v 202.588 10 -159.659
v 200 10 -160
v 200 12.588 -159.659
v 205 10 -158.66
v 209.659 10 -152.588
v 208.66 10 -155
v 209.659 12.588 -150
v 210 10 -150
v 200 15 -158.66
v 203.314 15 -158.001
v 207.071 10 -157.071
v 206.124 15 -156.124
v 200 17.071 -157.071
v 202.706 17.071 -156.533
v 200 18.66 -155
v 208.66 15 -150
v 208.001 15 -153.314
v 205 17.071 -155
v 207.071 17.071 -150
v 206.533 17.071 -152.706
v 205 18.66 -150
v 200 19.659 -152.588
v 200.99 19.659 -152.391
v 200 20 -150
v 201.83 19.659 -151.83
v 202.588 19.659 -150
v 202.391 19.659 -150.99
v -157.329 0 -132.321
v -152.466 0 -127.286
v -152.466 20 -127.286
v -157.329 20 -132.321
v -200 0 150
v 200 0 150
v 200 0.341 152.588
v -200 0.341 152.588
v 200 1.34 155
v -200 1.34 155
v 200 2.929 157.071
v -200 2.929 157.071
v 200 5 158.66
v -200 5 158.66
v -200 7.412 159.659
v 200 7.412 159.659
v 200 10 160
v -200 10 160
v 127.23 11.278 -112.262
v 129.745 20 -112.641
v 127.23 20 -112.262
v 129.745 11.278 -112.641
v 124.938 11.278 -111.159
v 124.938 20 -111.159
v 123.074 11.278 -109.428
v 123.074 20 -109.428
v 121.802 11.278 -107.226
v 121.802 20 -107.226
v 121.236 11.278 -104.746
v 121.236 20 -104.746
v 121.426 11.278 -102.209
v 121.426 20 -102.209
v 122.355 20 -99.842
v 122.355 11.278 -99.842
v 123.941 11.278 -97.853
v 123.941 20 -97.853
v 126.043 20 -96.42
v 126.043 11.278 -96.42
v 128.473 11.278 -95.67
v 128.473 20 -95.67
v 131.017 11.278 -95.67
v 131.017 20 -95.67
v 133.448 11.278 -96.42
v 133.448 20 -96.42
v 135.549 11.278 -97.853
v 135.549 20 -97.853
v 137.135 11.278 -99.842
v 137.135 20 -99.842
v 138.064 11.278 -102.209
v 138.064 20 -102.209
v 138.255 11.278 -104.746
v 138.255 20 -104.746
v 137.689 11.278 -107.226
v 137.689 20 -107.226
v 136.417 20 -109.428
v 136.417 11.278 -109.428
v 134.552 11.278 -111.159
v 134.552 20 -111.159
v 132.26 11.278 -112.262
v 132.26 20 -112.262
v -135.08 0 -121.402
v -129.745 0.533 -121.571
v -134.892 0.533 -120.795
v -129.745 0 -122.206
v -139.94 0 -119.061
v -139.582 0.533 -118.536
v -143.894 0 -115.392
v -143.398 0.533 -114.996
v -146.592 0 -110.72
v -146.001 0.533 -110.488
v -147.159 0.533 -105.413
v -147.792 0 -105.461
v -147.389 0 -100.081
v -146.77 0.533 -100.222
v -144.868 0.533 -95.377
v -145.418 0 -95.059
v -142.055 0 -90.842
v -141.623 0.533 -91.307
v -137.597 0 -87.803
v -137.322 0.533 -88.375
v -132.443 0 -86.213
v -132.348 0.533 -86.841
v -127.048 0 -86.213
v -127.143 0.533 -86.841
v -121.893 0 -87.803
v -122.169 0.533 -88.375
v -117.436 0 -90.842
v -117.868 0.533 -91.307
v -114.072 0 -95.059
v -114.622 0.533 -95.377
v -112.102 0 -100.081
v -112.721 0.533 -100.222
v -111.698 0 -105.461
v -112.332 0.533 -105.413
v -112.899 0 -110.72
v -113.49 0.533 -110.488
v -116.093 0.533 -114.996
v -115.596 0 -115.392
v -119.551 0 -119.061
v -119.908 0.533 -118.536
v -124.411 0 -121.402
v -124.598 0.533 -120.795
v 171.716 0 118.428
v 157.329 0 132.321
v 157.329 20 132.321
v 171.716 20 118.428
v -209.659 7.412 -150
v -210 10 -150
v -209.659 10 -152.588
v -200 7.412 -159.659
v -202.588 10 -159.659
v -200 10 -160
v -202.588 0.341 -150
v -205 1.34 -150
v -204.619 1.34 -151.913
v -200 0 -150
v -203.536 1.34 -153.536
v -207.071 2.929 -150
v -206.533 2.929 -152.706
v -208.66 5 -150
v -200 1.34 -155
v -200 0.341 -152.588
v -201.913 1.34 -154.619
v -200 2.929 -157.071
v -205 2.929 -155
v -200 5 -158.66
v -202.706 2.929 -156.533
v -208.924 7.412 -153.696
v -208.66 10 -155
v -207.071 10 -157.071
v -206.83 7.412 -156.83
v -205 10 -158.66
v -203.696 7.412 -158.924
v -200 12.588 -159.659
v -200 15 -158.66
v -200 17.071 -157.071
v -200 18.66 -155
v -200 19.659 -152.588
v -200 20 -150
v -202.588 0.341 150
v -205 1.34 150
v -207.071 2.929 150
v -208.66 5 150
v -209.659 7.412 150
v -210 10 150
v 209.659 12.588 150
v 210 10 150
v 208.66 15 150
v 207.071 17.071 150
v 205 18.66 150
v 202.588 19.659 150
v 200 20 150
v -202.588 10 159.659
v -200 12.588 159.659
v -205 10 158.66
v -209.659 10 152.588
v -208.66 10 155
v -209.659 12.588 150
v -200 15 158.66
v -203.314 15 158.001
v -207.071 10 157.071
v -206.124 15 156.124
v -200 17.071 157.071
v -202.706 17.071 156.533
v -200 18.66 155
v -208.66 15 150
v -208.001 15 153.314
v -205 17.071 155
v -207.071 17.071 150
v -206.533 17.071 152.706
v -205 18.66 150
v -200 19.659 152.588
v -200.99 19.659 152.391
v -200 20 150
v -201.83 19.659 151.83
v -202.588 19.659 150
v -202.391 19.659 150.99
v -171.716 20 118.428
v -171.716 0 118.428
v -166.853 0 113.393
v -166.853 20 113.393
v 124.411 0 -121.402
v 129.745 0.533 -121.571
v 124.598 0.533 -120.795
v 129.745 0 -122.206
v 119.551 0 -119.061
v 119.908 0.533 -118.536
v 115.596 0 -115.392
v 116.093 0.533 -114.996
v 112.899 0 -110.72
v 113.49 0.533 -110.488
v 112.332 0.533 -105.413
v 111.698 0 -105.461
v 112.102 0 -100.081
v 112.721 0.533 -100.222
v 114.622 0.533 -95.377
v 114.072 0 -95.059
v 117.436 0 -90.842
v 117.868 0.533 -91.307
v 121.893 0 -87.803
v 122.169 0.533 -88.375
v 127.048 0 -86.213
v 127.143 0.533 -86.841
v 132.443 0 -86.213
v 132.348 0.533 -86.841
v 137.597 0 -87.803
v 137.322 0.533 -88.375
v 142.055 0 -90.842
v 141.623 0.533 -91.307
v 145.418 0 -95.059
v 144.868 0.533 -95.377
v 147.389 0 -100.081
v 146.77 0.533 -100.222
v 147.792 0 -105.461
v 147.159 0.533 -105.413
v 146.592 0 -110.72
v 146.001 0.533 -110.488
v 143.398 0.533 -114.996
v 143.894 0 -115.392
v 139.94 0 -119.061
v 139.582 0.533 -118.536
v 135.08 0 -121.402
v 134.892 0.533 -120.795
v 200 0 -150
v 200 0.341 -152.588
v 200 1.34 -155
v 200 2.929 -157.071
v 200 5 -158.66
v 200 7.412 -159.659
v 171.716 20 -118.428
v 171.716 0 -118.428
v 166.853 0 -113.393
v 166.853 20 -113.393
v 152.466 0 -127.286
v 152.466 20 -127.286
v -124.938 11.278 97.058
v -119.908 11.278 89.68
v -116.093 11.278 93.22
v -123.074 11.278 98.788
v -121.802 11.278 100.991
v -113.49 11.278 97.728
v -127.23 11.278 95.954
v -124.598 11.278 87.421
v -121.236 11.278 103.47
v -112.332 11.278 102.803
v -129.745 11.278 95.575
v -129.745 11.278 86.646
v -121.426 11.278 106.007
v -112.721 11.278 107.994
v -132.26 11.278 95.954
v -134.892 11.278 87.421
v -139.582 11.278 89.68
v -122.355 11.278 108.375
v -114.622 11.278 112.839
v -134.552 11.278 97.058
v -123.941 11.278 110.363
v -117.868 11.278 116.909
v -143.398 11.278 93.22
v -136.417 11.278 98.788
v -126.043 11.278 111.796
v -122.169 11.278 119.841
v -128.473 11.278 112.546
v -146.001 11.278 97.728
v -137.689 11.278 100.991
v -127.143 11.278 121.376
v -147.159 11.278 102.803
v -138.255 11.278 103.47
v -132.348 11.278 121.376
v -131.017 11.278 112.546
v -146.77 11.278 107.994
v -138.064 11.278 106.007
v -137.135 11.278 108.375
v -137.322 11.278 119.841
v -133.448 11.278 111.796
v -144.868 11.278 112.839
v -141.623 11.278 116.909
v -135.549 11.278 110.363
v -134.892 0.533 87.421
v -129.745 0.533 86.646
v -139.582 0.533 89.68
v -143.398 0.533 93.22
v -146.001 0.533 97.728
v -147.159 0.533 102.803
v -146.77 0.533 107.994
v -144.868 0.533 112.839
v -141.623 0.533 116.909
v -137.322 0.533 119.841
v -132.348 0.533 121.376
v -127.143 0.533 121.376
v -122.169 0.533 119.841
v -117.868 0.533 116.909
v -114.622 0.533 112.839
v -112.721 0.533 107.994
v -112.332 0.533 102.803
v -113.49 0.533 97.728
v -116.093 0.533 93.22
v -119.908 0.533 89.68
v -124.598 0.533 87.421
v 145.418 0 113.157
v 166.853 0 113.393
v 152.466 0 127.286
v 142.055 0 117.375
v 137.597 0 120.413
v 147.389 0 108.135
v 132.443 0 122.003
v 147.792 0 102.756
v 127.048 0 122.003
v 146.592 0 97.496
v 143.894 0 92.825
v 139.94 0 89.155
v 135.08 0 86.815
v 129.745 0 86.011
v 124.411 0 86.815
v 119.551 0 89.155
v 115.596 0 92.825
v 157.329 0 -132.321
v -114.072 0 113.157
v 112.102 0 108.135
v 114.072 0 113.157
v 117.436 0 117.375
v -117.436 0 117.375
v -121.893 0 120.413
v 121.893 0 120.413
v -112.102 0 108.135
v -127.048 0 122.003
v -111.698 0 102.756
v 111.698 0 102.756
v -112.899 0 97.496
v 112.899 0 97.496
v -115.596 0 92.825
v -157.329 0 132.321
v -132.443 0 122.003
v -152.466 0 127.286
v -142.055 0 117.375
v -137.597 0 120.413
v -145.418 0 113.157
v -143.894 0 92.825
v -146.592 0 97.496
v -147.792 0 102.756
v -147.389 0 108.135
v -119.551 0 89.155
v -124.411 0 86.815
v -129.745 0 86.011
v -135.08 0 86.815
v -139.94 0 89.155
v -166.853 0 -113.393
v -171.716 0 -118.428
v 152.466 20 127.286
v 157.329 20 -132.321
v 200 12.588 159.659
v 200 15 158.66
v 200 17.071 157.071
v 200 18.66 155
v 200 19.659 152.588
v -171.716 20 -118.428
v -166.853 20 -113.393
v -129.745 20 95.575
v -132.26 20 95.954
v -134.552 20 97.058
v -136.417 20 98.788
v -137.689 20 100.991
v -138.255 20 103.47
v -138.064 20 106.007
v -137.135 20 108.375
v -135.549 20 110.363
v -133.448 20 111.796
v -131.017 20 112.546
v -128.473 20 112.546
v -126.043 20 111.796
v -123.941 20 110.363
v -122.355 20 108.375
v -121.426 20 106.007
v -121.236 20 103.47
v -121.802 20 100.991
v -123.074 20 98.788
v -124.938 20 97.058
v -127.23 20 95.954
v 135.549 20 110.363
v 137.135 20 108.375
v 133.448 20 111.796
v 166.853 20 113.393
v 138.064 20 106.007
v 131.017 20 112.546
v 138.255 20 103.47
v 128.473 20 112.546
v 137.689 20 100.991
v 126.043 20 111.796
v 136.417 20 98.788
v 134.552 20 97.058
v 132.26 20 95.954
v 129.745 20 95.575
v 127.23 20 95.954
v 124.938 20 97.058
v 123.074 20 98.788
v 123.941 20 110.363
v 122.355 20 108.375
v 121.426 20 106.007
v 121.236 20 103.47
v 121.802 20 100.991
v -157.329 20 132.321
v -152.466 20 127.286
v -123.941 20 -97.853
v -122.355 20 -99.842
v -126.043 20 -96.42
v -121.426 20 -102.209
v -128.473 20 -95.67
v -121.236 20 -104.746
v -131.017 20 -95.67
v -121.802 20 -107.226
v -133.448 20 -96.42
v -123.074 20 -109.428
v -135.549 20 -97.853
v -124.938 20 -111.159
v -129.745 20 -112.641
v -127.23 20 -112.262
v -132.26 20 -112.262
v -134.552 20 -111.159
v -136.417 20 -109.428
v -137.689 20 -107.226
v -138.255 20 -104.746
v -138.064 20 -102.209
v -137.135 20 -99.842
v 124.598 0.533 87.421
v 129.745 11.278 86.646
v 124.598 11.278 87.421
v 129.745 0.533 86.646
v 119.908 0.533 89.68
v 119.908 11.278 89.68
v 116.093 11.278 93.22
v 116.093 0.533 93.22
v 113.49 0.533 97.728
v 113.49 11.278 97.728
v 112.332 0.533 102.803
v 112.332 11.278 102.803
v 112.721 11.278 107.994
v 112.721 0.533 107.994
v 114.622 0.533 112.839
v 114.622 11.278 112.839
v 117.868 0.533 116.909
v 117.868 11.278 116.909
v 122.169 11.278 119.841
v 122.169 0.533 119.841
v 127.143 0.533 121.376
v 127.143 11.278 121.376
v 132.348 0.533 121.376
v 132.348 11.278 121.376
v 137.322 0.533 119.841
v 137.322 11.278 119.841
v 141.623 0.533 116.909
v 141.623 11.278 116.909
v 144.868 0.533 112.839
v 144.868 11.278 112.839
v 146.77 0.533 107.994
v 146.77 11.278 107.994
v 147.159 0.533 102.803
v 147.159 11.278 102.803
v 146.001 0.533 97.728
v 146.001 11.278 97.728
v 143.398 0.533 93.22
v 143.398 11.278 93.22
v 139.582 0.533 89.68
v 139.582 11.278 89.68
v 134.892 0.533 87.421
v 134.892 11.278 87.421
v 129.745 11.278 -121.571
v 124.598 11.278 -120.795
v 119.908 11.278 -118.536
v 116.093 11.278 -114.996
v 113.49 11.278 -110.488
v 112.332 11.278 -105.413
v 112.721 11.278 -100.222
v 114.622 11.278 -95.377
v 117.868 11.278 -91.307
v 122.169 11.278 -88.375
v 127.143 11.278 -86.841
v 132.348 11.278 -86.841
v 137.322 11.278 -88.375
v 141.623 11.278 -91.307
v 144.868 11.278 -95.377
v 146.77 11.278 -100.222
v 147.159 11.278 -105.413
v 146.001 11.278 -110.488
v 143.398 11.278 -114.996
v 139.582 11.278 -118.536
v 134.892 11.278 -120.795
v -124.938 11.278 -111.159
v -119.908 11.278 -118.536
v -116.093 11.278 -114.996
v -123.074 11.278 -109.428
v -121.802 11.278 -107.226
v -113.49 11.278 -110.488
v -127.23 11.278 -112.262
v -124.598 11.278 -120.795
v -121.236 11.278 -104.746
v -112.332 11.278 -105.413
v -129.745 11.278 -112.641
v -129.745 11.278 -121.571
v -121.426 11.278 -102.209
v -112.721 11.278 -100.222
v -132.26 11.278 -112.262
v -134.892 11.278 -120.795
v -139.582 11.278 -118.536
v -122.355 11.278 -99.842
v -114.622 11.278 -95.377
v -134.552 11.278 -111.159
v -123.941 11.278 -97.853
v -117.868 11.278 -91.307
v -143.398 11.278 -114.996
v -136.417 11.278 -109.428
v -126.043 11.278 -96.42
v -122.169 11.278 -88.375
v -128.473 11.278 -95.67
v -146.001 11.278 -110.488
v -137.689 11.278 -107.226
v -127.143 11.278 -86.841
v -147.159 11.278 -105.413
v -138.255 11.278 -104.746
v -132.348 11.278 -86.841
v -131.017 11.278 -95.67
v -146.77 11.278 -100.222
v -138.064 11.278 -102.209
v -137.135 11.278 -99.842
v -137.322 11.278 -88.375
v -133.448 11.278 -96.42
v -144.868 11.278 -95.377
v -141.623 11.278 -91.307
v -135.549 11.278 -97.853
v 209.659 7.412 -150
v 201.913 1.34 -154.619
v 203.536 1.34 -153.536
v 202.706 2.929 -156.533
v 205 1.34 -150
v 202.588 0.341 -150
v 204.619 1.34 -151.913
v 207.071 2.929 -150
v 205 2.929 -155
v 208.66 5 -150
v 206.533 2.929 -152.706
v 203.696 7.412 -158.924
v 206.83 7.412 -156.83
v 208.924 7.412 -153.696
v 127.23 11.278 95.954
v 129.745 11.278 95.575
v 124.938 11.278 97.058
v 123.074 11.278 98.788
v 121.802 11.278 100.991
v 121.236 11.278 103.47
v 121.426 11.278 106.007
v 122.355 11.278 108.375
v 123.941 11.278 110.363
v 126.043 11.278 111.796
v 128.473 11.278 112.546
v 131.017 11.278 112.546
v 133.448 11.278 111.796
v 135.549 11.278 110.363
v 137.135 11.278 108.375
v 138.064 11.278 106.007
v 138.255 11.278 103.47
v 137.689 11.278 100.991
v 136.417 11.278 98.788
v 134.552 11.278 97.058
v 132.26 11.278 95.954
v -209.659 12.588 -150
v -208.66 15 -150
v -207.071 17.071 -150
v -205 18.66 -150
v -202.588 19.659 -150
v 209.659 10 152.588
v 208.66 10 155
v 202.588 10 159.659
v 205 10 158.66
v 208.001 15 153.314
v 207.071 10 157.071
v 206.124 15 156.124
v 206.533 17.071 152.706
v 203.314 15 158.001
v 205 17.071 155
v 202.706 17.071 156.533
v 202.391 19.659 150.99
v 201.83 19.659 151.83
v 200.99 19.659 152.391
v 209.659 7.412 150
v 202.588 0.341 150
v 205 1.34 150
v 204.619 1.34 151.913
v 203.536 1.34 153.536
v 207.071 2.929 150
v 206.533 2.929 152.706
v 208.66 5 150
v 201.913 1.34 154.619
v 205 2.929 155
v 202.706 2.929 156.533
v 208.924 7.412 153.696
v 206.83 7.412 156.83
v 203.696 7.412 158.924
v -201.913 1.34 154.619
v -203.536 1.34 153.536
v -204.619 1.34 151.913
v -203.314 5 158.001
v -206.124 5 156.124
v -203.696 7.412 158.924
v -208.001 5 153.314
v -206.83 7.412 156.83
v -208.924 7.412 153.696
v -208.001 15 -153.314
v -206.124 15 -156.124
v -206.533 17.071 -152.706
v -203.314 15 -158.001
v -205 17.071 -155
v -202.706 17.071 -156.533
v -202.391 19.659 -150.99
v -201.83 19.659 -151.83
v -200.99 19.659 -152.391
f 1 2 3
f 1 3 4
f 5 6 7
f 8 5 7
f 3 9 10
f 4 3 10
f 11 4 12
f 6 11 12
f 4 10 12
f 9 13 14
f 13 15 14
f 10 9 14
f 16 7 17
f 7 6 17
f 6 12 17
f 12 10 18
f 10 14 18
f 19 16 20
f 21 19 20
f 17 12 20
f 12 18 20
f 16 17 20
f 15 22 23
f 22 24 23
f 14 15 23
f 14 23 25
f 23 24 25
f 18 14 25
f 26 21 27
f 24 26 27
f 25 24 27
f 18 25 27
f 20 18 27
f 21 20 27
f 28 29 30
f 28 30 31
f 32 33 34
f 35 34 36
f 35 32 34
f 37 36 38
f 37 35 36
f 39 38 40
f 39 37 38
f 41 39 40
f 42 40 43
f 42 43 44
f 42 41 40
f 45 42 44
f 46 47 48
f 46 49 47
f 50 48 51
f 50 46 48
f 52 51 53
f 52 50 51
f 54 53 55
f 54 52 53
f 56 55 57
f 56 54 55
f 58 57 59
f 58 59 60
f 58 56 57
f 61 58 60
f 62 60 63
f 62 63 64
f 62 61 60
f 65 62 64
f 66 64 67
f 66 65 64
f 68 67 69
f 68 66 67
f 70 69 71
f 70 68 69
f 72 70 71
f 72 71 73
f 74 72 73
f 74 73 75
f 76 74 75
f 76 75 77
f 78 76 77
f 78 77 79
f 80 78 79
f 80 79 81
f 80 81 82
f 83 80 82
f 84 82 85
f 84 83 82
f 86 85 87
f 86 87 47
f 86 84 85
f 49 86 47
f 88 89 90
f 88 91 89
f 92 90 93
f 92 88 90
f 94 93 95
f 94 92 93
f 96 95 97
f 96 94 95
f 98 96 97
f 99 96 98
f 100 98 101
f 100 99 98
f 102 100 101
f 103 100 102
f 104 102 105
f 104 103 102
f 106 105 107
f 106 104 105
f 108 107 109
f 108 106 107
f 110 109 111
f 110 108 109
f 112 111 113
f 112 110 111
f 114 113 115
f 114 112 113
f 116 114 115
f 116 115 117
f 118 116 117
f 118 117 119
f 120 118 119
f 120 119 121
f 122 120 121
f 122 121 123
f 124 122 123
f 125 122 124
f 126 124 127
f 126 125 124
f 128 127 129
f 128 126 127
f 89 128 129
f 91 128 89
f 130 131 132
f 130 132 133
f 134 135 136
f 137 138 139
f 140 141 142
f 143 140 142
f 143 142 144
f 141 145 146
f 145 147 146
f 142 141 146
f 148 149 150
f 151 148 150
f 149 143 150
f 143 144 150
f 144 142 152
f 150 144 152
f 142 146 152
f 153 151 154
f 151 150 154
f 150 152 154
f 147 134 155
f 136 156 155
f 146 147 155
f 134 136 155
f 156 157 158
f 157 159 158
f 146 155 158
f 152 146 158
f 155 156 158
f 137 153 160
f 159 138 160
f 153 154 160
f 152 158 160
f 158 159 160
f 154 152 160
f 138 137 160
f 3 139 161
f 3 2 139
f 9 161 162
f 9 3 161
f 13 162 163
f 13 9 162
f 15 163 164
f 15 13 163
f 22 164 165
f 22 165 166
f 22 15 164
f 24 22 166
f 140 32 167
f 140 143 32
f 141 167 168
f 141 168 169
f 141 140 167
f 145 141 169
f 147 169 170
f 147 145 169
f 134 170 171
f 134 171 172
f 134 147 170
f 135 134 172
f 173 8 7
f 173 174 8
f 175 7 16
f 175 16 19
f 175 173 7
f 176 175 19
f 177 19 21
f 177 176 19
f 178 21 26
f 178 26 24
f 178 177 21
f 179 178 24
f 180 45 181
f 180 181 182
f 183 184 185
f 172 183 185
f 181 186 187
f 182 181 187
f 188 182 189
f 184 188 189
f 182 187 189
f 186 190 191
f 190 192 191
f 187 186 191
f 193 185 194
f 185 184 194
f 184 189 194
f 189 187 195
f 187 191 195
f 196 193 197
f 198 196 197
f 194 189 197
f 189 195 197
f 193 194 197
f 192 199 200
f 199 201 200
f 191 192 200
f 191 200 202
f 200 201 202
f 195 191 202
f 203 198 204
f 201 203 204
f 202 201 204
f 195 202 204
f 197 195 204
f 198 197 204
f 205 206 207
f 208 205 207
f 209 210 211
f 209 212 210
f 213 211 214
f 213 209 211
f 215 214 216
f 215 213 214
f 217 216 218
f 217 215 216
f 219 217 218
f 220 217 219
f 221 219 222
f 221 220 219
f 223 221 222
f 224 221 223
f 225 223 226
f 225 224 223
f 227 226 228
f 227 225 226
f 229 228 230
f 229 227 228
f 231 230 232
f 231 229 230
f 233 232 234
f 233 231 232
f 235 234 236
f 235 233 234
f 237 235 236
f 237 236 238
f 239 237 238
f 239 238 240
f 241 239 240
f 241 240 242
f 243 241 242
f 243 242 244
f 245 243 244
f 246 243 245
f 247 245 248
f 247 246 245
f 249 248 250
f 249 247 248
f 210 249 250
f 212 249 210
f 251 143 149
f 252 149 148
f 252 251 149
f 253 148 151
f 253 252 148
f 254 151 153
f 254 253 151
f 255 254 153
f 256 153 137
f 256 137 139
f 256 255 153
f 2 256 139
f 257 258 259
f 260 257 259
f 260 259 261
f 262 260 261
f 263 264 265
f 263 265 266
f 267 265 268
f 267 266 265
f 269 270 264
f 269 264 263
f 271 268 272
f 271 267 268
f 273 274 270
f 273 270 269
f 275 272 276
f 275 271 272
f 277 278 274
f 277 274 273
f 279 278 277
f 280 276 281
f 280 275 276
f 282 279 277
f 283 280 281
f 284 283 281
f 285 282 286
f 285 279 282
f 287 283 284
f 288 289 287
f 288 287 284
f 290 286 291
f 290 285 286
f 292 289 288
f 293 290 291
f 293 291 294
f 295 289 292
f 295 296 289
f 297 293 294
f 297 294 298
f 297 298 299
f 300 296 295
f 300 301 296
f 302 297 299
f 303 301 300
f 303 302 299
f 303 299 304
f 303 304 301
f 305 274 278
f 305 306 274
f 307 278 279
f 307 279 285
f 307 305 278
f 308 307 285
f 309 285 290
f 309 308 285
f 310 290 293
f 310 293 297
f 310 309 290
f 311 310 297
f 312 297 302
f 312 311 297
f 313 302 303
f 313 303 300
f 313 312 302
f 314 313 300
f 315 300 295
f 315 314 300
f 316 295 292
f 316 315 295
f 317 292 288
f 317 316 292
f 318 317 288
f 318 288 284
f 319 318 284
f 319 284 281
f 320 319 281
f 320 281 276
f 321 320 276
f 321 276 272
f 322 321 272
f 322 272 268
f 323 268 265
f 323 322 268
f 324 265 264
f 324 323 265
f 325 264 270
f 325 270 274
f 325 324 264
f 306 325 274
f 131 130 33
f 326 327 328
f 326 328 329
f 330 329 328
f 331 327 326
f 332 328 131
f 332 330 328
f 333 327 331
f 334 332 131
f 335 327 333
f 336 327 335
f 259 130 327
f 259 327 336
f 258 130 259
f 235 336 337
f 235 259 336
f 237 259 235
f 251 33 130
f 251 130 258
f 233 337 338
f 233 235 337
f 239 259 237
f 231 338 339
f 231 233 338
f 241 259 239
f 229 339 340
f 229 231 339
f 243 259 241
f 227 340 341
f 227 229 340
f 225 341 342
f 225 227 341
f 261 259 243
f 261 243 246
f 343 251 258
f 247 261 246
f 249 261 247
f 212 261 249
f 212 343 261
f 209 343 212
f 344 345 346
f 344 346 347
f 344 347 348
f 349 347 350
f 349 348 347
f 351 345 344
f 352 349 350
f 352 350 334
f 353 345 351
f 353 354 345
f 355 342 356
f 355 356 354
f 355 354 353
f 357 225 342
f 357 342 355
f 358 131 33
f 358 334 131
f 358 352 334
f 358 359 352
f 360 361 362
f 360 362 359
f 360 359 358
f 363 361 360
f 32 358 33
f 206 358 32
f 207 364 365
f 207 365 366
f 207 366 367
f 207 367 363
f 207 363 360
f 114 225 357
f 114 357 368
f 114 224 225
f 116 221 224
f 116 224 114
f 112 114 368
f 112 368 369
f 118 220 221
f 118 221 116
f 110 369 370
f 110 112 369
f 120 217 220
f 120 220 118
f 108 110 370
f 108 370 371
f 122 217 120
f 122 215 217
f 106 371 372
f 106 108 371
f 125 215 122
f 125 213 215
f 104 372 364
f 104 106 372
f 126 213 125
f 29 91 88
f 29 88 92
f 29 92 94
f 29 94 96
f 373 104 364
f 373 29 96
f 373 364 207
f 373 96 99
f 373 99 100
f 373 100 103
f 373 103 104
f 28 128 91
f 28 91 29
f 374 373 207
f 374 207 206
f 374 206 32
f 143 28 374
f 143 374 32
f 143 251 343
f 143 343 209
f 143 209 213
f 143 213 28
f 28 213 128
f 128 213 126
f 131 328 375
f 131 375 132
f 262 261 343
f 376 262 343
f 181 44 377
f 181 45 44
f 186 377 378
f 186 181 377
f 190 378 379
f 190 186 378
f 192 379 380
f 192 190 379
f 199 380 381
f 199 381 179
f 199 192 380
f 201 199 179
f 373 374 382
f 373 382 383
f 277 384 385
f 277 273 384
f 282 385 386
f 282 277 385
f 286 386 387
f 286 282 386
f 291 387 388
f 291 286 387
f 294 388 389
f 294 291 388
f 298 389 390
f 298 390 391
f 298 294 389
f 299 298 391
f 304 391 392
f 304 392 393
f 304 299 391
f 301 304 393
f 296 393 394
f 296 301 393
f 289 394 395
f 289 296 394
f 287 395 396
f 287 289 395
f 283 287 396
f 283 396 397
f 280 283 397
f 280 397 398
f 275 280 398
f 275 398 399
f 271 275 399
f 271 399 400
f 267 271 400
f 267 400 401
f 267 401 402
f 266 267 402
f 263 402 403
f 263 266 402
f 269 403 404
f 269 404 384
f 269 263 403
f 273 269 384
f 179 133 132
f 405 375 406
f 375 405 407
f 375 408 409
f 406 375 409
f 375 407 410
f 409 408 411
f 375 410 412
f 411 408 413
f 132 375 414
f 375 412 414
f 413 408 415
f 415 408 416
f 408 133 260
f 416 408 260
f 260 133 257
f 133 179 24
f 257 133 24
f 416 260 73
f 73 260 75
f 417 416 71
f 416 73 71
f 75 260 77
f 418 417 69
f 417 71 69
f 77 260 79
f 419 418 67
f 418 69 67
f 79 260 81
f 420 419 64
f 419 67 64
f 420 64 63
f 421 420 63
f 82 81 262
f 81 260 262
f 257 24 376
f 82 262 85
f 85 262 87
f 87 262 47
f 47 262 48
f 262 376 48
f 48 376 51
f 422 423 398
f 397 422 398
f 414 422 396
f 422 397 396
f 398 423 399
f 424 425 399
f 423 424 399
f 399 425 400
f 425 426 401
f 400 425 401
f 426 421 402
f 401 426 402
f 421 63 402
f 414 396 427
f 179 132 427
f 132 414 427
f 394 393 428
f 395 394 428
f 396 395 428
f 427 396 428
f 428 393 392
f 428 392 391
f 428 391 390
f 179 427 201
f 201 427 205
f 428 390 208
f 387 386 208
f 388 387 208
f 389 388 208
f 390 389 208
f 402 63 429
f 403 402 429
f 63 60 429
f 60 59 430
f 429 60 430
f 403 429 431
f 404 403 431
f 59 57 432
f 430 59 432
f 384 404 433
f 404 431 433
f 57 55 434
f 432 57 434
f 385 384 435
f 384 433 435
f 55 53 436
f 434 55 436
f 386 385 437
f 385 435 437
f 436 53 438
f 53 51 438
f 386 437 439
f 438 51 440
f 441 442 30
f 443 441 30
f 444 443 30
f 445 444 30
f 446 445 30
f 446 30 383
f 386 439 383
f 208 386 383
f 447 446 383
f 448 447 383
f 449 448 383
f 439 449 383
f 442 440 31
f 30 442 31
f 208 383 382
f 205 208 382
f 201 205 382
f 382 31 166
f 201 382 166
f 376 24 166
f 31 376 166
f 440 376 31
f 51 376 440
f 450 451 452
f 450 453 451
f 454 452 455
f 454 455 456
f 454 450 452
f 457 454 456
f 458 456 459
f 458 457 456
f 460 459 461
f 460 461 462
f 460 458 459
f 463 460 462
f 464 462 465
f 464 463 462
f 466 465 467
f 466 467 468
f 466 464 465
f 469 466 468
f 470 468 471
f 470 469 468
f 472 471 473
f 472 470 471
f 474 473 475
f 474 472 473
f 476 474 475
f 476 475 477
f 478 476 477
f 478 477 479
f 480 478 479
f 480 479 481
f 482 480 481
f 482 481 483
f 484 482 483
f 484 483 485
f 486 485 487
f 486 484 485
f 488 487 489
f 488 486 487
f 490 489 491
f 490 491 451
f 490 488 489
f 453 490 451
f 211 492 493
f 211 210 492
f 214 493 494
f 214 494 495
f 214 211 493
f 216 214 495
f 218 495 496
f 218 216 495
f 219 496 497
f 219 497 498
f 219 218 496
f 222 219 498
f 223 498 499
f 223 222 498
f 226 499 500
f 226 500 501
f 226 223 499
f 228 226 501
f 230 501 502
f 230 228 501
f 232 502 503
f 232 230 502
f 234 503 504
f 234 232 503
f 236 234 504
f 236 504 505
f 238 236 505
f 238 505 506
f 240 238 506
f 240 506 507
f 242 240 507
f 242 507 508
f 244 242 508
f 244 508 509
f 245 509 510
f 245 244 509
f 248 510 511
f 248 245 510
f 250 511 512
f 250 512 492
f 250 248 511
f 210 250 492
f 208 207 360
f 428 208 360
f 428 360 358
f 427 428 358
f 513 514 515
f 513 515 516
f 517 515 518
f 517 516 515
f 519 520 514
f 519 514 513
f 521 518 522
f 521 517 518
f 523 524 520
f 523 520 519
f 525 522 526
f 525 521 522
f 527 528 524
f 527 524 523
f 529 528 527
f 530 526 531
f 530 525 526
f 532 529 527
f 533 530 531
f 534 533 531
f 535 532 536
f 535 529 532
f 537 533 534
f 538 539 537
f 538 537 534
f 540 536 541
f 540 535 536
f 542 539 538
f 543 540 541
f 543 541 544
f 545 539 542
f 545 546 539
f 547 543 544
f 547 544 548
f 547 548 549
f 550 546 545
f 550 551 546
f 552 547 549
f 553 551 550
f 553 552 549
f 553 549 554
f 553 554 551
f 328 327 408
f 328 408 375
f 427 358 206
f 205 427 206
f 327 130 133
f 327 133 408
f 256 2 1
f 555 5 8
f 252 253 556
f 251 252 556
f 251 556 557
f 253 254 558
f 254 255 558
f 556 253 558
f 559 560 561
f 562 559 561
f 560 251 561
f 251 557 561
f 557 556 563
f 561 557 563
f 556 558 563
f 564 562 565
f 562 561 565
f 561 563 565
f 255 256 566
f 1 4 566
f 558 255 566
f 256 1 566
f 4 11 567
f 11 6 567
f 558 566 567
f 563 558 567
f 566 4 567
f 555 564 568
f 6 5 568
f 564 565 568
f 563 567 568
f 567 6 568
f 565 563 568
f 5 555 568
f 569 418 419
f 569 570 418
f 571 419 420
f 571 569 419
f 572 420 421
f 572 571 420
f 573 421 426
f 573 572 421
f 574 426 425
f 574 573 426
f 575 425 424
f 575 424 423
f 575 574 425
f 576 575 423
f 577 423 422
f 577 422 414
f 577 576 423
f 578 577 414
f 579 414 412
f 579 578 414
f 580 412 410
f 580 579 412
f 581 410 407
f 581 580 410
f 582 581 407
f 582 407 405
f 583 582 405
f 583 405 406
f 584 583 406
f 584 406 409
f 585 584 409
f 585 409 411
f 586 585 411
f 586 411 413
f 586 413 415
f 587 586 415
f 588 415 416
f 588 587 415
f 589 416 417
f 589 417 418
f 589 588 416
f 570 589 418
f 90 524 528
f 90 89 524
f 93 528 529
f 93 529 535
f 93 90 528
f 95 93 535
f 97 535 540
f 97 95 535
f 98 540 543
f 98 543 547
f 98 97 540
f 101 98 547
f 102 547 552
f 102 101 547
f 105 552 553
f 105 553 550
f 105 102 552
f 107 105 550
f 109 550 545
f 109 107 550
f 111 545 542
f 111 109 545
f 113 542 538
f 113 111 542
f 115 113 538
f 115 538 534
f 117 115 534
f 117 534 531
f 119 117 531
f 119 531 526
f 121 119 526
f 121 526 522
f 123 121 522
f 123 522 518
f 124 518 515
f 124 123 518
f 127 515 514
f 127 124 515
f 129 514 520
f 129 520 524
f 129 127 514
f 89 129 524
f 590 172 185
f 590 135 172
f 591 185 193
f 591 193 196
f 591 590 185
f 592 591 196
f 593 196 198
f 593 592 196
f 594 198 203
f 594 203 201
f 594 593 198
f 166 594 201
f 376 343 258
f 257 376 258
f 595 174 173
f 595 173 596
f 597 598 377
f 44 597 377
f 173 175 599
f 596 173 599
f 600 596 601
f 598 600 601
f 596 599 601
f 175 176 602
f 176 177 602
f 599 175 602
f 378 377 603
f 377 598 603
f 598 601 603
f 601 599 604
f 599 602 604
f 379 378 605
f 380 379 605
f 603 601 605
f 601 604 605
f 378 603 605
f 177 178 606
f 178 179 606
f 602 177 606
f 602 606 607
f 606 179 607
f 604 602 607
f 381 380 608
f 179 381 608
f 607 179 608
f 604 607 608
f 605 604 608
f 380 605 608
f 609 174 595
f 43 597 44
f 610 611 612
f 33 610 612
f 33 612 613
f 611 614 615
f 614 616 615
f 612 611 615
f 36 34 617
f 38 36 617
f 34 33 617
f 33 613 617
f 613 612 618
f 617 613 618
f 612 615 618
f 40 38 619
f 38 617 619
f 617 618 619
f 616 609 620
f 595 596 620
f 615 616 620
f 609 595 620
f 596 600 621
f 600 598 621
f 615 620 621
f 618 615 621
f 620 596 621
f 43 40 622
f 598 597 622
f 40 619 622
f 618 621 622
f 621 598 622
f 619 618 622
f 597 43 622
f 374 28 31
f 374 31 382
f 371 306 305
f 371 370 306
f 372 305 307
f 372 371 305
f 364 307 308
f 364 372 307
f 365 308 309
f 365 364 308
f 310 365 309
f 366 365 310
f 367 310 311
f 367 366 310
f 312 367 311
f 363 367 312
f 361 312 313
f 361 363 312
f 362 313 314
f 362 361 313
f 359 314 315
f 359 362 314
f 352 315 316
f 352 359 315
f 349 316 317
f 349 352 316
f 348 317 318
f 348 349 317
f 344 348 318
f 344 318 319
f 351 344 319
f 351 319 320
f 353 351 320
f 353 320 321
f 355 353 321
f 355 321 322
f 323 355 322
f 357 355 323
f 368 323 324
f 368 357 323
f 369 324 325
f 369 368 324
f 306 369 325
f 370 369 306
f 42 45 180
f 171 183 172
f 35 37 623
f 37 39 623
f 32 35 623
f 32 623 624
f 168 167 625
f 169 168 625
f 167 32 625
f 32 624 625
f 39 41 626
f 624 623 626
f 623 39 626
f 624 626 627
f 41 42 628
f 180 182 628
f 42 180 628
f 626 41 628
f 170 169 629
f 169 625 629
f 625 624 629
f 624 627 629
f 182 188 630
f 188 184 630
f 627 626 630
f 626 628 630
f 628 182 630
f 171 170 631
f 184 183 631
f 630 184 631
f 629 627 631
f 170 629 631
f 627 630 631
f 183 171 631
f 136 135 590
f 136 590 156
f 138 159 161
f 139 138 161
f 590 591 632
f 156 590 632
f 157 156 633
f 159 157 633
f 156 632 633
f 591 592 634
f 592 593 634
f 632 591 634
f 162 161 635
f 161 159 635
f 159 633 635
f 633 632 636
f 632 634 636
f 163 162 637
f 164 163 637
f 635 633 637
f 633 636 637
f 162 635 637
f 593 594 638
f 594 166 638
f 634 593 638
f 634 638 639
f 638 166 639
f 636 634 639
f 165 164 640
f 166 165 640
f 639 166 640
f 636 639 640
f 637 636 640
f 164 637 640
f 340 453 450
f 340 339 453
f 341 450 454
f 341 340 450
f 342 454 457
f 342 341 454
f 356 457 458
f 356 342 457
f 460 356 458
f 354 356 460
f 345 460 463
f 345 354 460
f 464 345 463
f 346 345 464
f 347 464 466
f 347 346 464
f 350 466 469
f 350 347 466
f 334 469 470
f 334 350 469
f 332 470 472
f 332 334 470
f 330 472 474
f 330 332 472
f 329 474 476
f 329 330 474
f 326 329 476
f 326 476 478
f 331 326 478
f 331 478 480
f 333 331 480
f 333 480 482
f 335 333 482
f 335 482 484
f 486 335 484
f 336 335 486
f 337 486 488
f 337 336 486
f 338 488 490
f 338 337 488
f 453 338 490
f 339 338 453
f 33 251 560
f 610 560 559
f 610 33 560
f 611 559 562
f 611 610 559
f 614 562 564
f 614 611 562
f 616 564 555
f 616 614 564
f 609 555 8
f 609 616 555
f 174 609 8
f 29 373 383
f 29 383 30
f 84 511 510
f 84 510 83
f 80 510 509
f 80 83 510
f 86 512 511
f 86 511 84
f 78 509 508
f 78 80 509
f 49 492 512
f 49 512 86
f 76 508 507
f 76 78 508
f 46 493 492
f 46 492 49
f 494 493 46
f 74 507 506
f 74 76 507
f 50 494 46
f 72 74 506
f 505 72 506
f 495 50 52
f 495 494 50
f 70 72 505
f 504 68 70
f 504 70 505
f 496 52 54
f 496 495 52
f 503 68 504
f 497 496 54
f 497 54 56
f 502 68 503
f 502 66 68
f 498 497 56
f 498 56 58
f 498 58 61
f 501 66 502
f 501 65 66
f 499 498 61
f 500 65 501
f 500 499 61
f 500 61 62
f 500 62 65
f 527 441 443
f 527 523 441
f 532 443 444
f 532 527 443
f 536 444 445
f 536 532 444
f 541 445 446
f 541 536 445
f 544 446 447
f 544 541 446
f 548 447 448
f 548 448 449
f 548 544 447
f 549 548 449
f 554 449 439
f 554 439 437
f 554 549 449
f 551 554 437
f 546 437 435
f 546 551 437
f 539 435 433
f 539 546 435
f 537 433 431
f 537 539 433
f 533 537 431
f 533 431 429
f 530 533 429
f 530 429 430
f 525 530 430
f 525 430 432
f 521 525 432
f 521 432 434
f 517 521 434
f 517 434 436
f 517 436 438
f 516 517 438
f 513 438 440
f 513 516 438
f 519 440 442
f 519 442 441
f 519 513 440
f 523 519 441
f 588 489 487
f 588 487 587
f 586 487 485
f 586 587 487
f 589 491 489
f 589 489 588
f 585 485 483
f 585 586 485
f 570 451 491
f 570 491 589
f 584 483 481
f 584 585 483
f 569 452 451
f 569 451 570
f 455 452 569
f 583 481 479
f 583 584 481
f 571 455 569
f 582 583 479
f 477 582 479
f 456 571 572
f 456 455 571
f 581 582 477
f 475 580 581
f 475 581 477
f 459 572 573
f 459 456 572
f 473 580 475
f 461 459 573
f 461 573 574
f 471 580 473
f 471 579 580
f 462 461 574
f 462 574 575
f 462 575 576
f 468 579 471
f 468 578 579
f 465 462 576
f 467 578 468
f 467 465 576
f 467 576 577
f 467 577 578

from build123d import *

# Parameters (mm, degrees)
EXTRUDE_1_DEPTH              = 20
HOLE_WIZARD_5_8_1_AT_2_COUNT = 2
HOLE_WIZARD_5_8_1_AT_2_PITCH = 259.490550386
HOLE_WIZARD_5_8_1_AT_3_COUNT = 2
HOLE_WIZARD_5_8_1_AT_3_PITCH = 208.21625411
HOLE_WIZARD_5_8_1_AT_4_COUNT = 2
HOLE_WIZARD_5_8_1_AT_4_PITCH = 332.700096506
FILLET_1_R                   = 10


with BuildPart() as part:
    # 草图2 → 凸台-拉伸1 (new body)
    with BuildSketch(Plane(origin=(0, 0, 0), x_dir=(1, 0, 0), z_dir=(0, 1, 0))):
        with BuildLine():
            Line((-200, 160), (200, 160))
            ThreePointArc((200, 160), (207.071067812, 157.071067812), (210, 150))
            Line((210, 150), (210, 0))
            Line((210, 0), (210, -150))
            ThreePointArc((210, -150), (207.071067812, -157.071067812), (200, -160))
            Line((200, -160), (-200, -160))
            ThreePointArc((-200, -160), (-207.071067812, -157.071067812), (-210, -150))
            Line((-210, -150), (-210, 0))
            Line((-210, 0), (-210, 150))
            ThreePointArc((-210, 150), (-207.071067812, 157.071067812), (-200, 160))
        make_face()
        Polygon((-157.328690373, 132.321363833), (-171.715726709, 118.428445296), (-166.853205221, 113.392982578), (-152.466168885, 127.285901115), align=None, mode=Mode.SUBTRACT)
        Polygon((-171.715726709, -118.428445296), (-166.853205221, -113.392982578), (-152.466168885, -127.285901115), (-157.328690373, -132.321363833), align=None, mode=Mode.SUBTRACT)
        Polygon((157.328690373, -132.321363833), (171.715726709, -118.428445296), (166.853205221, -113.392982578), (152.466168885, -127.285901115), align=None, mode=Mode.SUBTRACT)
        Polygon((171.715726709, 118.428445296), (166.853205221, 113.392982578), (152.466168885, 127.285901115), (157.328690373, 132.321363833), align=None, mode=Mode.SUBTRACT)
    extrude(amount=EXTRUDE_1_DEPTH)

    # 草图16 → 5/8 六角头螺钉的柱形沉头孔1 (revolve, cut)
    with BuildSketch(Plane(origin=(-129.745275193, 0, 104.108127055), x_dir=(0, 0, -1), z_dir=(1, 0, 0))):
        Polygon((0, 0), (0, 20), (8.53313, 20), (8.53313, 11.2776), (17.4625, 11.2776), (17.4625, 0.532828266), (18.0975, 0), align=None)
    hole_wizard_5_8_1 = revolve(axis=Axis((-129.745275193, -6.35, 104.108127055), (0, 1, 0)), mode=Mode.SUBTRACT)

    # 5/8 六角头螺钉的柱形沉头孔1 at 2: 5/8 六角头螺钉的柱形沉头孔1 ×2
    with Locations(*[(i * HOLE_WIZARD_5_8_1_AT_2_PITCH, 0, 0) for i in range(1, HOLE_WIZARD_5_8_1_AT_2_COUNT)]):
        add(hole_wizard_5_8_1, mode=Mode.SUBTRACT)

    # 5/8 六角头螺钉的柱形沉头孔1 at 3: 5/8 六角头螺钉的柱形沉头孔1 ×2
    with Locations(*[(0, 0, -i * HOLE_WIZARD_5_8_1_AT_3_PITCH) for i in range(1, HOLE_WIZARD_5_8_1_AT_3_COUNT)]):
        add(hole_wizard_5_8_1, mode=Mode.SUBTRACT)

    # 5/8 六角头螺钉的柱形沉头孔1 at 4: 5/8 六角头螺钉的柱形沉头孔1 ×2
    with Locations(*[Vector(0.779953336687125, 0, -0.6258376727160331) * (i * HOLE_WIZARD_5_8_1_AT_4_PITCH) for i in range(1, HOLE_WIZARD_5_8_1_AT_4_COUNT)]):
        add(hole_wizard_5_8_1, mode=Mode.SUBTRACT)

    # 圆角1
    fillet_1_edges = [part.edges().sort_by_distance(p)[0] for p in [
        (-210, 0, 0),
        (0, 0, -160),
        (210, 0, 0),
        (0, 20, -160),
        (-210, 20, 0),
        (0, 20, 160),
        (210, 20, 0),
        (0, 0, 160),
        (207.071067812, 20, -157.071067812),
        (-207.071067812, 0, 157.071067812),
        (-207.071067812, 0, -157.071067812),
        (207.071067812, 20, 157.071067812),
    ]]
    fillet(fillet_1_edges, radius=FILLET_1_R - 0.0001)  # a hair under: the kernel refuses the full size


solid = part.part
